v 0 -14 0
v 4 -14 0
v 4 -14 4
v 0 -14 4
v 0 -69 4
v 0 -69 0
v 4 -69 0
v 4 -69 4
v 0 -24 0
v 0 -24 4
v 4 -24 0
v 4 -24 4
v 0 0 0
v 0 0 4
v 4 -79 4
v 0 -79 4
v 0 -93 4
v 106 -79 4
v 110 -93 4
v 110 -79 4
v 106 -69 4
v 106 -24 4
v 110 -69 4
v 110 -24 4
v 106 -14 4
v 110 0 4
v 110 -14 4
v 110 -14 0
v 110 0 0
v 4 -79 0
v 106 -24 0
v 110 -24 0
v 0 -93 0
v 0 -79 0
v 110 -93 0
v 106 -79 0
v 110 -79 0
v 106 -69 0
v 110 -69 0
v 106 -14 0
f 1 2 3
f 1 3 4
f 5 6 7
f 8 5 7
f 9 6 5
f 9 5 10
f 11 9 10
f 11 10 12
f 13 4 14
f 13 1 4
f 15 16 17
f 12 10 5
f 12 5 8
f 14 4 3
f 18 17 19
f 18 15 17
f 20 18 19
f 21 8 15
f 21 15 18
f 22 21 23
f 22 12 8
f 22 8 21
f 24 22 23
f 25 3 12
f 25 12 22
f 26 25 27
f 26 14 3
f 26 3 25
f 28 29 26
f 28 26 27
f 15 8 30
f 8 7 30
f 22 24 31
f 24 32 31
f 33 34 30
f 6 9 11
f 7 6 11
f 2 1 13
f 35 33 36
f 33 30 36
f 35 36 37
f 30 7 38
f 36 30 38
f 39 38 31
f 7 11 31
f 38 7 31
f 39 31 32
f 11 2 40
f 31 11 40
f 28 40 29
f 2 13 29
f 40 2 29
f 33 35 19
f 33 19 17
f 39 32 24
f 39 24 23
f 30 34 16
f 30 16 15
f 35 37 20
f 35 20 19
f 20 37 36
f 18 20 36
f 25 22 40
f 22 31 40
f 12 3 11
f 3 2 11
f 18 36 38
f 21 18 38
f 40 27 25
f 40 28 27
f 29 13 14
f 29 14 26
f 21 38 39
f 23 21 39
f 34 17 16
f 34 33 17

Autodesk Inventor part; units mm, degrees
ref_plane "YZ Plane" through (0, 0, 0) normal (1, 0, 0) x (0, 1, 0)
ref_plane "XZ Plane" through (0, 0, 0) normal (0, 1, 0) x (-1, 0, 0)
ref_plane "XY Plane" through (0, 0, 0) normal (0, 0, 1) x (1, 0, 0)
sketch "Sketch1" plane through (0, 0, 0) normal (0, 0, 1) x (1, 0, 0)
  line L0 (0, -24) -> (0, -14)
  line L1 (4, -14) -> (4, -24)
  line L2 (0, -79) -> (0, -69)
  line L3 (4, -69) -> (4, -79)
  line L4 (0, -69) -> (4, -69)
  line L5 (0, -79) -> (4, -79)
  line L6 (106, -79) -> (106, -69)
  line L7 (110, -69) -> (110, -79)
  line L8 (110, -14) -> (106, -14)
  line L9 (110, -24) -> (106, -24)
  line L10 (106, -24) -> (106, -14)
  line L11 (110, -14) -> (110, -24)
  line L12 (0, 0) -> (110, 0)
  line L13 (110, 0) -> (110, -93)
  line L14 (110, -93) -> (0, -93)
  line L15 (0, -93) -> (0, 0)
  line L16 (4, -14) -> (0, -14)
  line L17 (0, -14) -> (0, -24)
  line L18 (0, -24) -> (4, -24)
  line L19 (4, -24) -> (4, -14)
  line L20 (106, -69) -> (110, -69)
  line L21 (110, -69) -> (110, -79)
  line L22 (110, -79) -> (106, -79)
  line L23 (106, -79) -> (106, -69)
extrude "Extrusion1" add sketch "Sketch1" along normal blind 4 contours L18 L1 L16 L15 L12 L13 L8 L10 L9 L20 L6 L22 L14 L5 L3 L4
properties part number "TAPA_CAJA"
